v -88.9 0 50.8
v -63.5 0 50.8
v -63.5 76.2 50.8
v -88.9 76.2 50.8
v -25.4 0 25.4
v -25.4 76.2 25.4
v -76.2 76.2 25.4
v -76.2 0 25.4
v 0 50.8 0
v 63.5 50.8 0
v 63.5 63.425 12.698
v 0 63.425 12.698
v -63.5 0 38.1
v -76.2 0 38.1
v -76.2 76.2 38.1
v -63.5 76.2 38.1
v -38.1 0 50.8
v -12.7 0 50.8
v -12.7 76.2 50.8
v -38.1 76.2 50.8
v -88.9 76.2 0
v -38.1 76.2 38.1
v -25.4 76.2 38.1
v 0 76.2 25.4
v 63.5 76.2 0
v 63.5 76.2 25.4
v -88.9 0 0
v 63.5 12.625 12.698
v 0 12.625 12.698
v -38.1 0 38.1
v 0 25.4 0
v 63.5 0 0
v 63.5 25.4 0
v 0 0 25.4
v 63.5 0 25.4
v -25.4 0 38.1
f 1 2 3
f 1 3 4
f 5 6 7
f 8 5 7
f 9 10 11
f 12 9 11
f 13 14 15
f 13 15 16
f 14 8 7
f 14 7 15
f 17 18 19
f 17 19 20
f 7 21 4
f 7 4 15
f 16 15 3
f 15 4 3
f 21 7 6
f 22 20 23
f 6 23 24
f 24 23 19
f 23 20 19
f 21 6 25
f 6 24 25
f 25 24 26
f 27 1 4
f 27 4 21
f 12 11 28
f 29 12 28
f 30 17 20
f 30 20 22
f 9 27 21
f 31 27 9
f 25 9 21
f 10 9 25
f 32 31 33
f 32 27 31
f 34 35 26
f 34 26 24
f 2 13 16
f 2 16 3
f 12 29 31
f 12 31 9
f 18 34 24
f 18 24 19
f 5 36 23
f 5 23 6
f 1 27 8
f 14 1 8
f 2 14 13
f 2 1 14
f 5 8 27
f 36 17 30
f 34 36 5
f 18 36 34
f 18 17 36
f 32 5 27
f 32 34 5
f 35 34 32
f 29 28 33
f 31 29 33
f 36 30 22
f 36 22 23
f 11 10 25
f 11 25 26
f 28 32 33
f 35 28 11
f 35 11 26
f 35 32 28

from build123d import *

# Parameters (mm, degrees)
F1_DEPTH = 76.2
F3_DEPTH = 203.2


with BuildPart() as f1:
    # F0 (on Front) → F1 (new body)
    with BuildSketch(Plane.XZ):
        Polygon((-88.9, 50.8), (-88.9, 0), (63.5, 0), (63.5, 25.4), (0, 25.4), (-12.7, 50.8), (-38.1, 50.8), (-38.1, 38.1), (-25.4, 38.1), (-25.4, 25.4), (-76.2, 25.4), (-76.2, 38.1), (-63.5, 38.1), (-63.5, 50.8), align=None)
    extrude(amount=-F1_DEPTH)

    # F2 (on Right) → F3 (cut)
    with BuildSketch(Plane.YZ):
        Polygon((63.425437, 12.6984), (12.625437, 12.6984), (25.4, 0), (50.8, 0), align=None)
    extrude(amount=F3_DEPTH, mode=Mode.SUBTRACT)


solid = f1.part
